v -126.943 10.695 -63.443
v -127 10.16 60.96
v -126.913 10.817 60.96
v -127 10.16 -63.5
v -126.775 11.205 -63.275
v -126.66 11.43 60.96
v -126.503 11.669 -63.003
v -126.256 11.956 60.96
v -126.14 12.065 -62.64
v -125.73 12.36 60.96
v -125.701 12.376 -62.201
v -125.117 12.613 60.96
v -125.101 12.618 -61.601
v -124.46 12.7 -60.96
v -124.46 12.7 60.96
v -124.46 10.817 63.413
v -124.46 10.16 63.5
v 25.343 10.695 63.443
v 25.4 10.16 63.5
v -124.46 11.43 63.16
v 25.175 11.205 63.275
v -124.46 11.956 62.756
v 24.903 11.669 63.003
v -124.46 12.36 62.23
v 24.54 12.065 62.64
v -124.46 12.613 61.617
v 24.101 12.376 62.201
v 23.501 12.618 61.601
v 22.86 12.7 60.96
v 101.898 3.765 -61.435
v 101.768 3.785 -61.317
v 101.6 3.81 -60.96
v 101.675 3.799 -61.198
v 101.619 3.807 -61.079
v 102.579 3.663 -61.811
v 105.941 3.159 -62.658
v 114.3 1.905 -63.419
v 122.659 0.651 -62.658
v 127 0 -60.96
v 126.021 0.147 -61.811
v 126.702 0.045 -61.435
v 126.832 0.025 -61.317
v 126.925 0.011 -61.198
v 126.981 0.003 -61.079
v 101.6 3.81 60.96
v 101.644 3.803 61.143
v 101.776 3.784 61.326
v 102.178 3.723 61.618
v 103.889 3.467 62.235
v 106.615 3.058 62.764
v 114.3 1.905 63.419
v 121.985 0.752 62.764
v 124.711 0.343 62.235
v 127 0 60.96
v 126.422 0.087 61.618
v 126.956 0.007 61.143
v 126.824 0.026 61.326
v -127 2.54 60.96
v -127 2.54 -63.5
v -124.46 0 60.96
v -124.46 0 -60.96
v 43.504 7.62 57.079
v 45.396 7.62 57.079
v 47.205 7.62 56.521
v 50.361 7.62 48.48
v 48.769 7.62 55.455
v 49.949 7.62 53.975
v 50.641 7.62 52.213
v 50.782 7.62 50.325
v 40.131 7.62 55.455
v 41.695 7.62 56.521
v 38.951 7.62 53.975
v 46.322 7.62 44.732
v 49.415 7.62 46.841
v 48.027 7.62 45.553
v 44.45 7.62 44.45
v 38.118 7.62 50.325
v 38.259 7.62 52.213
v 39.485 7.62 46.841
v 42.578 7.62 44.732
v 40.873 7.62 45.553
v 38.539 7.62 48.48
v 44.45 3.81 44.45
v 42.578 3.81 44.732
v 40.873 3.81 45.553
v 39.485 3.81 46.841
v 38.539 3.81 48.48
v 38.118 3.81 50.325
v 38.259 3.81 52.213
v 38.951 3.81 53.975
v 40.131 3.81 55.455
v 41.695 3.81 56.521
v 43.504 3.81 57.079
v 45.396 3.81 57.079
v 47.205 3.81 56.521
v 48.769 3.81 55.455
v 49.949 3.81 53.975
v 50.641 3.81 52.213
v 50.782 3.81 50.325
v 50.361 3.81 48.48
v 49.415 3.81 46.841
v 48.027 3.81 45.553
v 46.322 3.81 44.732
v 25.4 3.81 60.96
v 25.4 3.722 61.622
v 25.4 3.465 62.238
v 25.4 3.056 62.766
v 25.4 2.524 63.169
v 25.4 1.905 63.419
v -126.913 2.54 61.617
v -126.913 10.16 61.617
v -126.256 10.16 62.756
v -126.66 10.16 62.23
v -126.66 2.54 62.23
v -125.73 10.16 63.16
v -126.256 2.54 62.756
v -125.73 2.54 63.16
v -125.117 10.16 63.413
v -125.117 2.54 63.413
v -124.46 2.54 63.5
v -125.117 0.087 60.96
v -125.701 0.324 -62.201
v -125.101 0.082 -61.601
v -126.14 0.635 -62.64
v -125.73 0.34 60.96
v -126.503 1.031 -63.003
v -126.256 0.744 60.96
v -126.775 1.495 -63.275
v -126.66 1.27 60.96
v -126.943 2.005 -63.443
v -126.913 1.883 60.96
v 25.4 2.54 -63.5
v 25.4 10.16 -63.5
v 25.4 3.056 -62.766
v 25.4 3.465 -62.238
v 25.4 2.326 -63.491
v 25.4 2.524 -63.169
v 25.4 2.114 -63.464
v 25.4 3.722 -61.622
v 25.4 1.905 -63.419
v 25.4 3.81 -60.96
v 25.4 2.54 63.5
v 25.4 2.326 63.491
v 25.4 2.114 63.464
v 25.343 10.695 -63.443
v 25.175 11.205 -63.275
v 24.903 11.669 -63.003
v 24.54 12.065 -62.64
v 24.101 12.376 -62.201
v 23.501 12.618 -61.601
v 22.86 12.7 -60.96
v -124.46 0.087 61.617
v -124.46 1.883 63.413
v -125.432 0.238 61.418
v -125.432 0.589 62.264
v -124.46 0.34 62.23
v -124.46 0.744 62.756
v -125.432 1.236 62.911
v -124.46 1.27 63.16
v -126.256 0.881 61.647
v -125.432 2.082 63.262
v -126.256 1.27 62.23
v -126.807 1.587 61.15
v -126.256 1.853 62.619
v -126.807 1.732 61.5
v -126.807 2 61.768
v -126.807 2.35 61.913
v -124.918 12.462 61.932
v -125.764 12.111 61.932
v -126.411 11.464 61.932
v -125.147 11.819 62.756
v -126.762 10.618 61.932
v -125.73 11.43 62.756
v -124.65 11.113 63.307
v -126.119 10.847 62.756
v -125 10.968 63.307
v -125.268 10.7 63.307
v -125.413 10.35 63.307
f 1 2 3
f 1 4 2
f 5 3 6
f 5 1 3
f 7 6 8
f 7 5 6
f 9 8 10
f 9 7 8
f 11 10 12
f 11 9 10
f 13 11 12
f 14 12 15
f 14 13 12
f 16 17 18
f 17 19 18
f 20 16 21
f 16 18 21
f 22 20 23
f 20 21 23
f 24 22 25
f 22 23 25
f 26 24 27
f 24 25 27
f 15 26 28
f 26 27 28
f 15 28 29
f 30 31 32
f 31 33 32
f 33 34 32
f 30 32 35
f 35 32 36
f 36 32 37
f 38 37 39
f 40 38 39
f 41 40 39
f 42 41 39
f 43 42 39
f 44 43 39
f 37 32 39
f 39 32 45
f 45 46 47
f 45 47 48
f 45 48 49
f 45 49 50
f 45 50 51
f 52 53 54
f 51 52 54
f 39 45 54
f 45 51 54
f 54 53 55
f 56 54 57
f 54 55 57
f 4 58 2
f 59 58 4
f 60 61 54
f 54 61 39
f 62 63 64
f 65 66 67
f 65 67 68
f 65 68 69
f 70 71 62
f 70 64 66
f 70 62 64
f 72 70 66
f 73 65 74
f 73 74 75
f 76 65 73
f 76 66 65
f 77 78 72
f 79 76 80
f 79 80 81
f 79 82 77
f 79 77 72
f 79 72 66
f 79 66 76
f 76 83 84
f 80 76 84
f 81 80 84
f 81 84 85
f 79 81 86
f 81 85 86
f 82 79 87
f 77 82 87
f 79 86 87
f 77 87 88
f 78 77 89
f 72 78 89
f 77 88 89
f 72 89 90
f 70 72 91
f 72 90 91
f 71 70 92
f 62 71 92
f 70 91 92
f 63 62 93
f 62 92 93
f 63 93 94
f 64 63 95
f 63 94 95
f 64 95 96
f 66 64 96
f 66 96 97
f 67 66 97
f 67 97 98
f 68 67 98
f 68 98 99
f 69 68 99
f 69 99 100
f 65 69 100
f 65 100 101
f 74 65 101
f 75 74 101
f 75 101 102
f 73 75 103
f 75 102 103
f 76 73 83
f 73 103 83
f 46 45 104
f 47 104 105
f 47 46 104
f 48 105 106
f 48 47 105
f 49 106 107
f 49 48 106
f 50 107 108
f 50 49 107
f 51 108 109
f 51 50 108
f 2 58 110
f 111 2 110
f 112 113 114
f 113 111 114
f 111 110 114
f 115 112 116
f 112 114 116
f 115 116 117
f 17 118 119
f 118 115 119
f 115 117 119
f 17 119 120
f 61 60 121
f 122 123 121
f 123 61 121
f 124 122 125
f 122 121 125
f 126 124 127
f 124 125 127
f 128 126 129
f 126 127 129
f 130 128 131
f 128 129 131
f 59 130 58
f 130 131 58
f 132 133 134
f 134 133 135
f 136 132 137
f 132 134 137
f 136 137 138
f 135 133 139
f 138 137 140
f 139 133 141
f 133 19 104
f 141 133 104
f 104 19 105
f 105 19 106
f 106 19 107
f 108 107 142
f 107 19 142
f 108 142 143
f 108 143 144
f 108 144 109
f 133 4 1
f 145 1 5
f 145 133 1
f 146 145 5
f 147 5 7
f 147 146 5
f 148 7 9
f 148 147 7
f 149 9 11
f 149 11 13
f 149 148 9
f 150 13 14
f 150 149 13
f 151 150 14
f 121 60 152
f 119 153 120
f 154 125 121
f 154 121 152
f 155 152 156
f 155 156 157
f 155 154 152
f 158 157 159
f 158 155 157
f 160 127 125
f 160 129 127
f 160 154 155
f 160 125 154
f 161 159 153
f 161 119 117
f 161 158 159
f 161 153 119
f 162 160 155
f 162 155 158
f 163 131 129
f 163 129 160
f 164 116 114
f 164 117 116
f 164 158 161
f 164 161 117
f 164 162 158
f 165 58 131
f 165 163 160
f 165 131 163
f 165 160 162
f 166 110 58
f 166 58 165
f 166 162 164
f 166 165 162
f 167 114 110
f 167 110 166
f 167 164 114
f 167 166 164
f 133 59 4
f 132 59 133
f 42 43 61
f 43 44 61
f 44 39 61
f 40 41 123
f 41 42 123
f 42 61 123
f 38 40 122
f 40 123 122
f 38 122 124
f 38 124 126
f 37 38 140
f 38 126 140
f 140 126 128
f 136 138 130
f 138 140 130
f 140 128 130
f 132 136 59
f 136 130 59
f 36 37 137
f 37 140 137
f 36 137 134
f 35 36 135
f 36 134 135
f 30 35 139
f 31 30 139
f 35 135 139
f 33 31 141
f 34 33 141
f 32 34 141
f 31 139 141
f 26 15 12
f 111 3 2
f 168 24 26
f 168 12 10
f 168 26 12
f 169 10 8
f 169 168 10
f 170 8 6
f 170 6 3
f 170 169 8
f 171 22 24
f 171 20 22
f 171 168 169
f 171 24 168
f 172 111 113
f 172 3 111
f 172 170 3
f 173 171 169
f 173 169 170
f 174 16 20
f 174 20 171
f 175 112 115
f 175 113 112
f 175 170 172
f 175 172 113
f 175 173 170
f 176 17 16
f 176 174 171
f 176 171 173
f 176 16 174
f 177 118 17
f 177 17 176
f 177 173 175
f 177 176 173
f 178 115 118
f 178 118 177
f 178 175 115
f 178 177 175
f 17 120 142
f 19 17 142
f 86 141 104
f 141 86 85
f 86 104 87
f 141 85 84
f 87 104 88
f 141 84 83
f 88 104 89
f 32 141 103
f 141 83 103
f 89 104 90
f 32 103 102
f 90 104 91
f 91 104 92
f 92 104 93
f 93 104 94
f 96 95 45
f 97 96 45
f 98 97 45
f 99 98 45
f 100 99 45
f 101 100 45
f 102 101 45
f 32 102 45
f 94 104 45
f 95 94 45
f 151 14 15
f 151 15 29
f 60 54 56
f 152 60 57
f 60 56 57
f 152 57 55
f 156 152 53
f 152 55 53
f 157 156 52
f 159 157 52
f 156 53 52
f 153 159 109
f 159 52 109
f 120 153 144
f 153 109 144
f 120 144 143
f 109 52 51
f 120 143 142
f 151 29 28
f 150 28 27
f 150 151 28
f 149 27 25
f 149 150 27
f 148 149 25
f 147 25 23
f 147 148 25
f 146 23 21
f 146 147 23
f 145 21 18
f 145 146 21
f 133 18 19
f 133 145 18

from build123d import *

# Parameters (mm, degrees)
SKETCH1_W           = 254
SKETCH1_H           = 127
BOSS_EXTRUDE1_DEPTH = 12.7
SKETCH2_OUTSIDE_W   = 312.852
SKETCH2_OUTSIDE_H   = 71.552
CUT_EXTRUDE2_DEPTH  = 181.05357536
FILLET1_R           = 2.54
FILLET4_R           = 2.54
FILLET5_R           = 2.54
SKETCH3_R           = 6.35
BOSS_EXTRUDE2_DEPTH = 3.81


with BuildPart() as part:
    # Sketch1 → Boss-Extrude1 (new body)
    with BuildSketch(Plane(origin=(0, 0, 0), x_dir=(1, 0, 0), z_dir=(0, 1, 0))):
        Rectangle(SKETCH1_W, SKETCH1_H)
    extrude(amount=BOSS_EXTRUDE1_DEPTH)

    # Sketch2 outside → Cut-Extrude2 (cut, through all)
    with BuildSketch(Plane.XY.offset(63.5)):
        with Locations((0, 6.35)):
            Rectangle(SKETCH2_OUTSIDE_W, SKETCH2_OUTSIDE_H)
        Polygon((25.4, 12.7), (25.4, 3.81), (101.6, 3.81), (127, 0), (-127, 0), (-127, 12.7), align=None, mode=Mode.SUBTRACT)
    extrude(amount=-CUT_EXTRUDE2_DEPTH, mode=Mode.SUBTRACT)

    # Fillet1
    fillet1_edges = [part.edges().sort_by_distance(p)[0] for p in [
        (-127, 12.7, 0),
        (-50.8, 12.7, -63.5),
        (-50.8, 12.7, 63.5),
        (25.4, 12.7, 0),
    ]]
    fillet(fillet1_edges, radius=FILLET1_R)

    # Fillet4
    fillet4_edges = [part.edges().sort_by_distance(p)[0] for p in [
        (63.5, 3.81, -63.5),
    ]]
    fillet(fillet4_edges, radius=FILLET4_R)
    fillet4_2_edges = [part.edges().sort_by_distance(p)[0] for p in [
        (63.5, 3.81, 63.5),
    ]]
    fillet(fillet4_2_edges, radius=FILLET4_R)
    fillet4_3_edges = [part.edges().sort_by_distance(p)[0] for p in [
        (0, 0, 63.5),
    ]]
    fillet(fillet4_3_edges, radius=FILLET4_R)

    # Fillet5
    # the kernel refuses this fillet: 2.54 mm, written as the material it takes off along each edge
    with BuildSketch(Plane(origin=(-124.46, 10.16, 60.96), x_dir=(-1, 0, 0), z_dir=(0, 0, 1))) as fillet5_piece_1_section:
        Polygon((0, 0), (FILLET5_R, 0), (FILLET5_R, -FILLET5_R), (0, -FILLET5_R), align=None)
    fillet5_piece_1 = extrude(amount=FILLET5_R, mode=Mode.PRIVATE)
    fillet5_piece_1 = fillet5_piece_1 - Plane(origin=(-124.46, 10.16, 60.96), x_dir=(0.7071067811865475, -0.7071067811865475, 0), z_dir=(0, 0, 1)) * Sphere(FILLET5_R, mode=Mode.PRIVATE)
    add(fillet5_piece_1, mode=Mode.SUBTRACT)
    with BuildSketch(Plane(origin=(-127, 2.54, 63.5), x_dir=(1, 0, 0), z_dir=(0, 1, 0))) as fillet5_piece_2:
        with BuildLine():
            CenterArc((FILLET5_R, FILLET5_R), FILLET5_R, 180, 90)
            Line((0, FILLET5_R), (0, 0))
            Line((0, 0), (FILLET5_R, 0))
        make_face()
    extrude(amount=7.62, mode=Mode.SUBTRACT)
    with BuildSketch(Plane(origin=(-127, 2.54, 60.96), x_dir=(0, -1, 0), z_dir=(0, 0, -1))) as fillet5_piece_3:
        with BuildLine():
            CenterArc((2.54 - FILLET5_R, -FILLET5_R), FILLET5_R, 0, 90)
            Line((2.54 - FILLET5_R, 0), (2.54, 0))
            Line((2.54, 0), (2.54, -FILLET5_R))
        make_face()
    revolve(axis=Axis((-127, 2.54, 60.96), (-1, 0, 0)), revolution_arc=90, mode=Mode.SUBTRACT)
    with BuildSketch(Plane(origin=(-127, 0, 60.96), x_dir=(1, 0, 0), z_dir=(0, 0, -1))) as fillet5_piece_4:
        with BuildLine():
            CenterArc((FILLET5_R, -FILLET5_R), FILLET5_R, 90, 90)
            Line((0, -FILLET5_R), (0, 0))
            Line((0, 0), (FILLET5_R, 0))
        make_face()
    extrude(amount=130.81, mode=Mode.SUBTRACT)
    with BuildSketch(Plane(origin=(-133.35, 0, -63.5), x_dir=(0, 1, 0), z_dir=(1, 0, 0))) as fillet5_piece_5:
        with BuildLine():
            CenterArc((FILLET5_R, FILLET5_R), FILLET5_R, 180, 90)
            Line((0, FILLET5_R), (0, 0))
            Line((0, 0), (FILLET5_R, 0))
        make_face()
    extrude(amount=266.7, mode=Mode.SUBTRACT)

    # Sketch3 → Boss-Extrude2 (add)
    with BuildSketch(Plane(origin=(0, 3.81, 0), x_dir=(1, 0, 0), z_dir=(0, 1, 0))):
        with Locations(Location((44.45, -50.8, 0), (0, 0, 90))):
            Circle(SKETCH3_R)
    extrude(amount=BOSS_EXTRUDE2_DEPTH)


solid = part.part
